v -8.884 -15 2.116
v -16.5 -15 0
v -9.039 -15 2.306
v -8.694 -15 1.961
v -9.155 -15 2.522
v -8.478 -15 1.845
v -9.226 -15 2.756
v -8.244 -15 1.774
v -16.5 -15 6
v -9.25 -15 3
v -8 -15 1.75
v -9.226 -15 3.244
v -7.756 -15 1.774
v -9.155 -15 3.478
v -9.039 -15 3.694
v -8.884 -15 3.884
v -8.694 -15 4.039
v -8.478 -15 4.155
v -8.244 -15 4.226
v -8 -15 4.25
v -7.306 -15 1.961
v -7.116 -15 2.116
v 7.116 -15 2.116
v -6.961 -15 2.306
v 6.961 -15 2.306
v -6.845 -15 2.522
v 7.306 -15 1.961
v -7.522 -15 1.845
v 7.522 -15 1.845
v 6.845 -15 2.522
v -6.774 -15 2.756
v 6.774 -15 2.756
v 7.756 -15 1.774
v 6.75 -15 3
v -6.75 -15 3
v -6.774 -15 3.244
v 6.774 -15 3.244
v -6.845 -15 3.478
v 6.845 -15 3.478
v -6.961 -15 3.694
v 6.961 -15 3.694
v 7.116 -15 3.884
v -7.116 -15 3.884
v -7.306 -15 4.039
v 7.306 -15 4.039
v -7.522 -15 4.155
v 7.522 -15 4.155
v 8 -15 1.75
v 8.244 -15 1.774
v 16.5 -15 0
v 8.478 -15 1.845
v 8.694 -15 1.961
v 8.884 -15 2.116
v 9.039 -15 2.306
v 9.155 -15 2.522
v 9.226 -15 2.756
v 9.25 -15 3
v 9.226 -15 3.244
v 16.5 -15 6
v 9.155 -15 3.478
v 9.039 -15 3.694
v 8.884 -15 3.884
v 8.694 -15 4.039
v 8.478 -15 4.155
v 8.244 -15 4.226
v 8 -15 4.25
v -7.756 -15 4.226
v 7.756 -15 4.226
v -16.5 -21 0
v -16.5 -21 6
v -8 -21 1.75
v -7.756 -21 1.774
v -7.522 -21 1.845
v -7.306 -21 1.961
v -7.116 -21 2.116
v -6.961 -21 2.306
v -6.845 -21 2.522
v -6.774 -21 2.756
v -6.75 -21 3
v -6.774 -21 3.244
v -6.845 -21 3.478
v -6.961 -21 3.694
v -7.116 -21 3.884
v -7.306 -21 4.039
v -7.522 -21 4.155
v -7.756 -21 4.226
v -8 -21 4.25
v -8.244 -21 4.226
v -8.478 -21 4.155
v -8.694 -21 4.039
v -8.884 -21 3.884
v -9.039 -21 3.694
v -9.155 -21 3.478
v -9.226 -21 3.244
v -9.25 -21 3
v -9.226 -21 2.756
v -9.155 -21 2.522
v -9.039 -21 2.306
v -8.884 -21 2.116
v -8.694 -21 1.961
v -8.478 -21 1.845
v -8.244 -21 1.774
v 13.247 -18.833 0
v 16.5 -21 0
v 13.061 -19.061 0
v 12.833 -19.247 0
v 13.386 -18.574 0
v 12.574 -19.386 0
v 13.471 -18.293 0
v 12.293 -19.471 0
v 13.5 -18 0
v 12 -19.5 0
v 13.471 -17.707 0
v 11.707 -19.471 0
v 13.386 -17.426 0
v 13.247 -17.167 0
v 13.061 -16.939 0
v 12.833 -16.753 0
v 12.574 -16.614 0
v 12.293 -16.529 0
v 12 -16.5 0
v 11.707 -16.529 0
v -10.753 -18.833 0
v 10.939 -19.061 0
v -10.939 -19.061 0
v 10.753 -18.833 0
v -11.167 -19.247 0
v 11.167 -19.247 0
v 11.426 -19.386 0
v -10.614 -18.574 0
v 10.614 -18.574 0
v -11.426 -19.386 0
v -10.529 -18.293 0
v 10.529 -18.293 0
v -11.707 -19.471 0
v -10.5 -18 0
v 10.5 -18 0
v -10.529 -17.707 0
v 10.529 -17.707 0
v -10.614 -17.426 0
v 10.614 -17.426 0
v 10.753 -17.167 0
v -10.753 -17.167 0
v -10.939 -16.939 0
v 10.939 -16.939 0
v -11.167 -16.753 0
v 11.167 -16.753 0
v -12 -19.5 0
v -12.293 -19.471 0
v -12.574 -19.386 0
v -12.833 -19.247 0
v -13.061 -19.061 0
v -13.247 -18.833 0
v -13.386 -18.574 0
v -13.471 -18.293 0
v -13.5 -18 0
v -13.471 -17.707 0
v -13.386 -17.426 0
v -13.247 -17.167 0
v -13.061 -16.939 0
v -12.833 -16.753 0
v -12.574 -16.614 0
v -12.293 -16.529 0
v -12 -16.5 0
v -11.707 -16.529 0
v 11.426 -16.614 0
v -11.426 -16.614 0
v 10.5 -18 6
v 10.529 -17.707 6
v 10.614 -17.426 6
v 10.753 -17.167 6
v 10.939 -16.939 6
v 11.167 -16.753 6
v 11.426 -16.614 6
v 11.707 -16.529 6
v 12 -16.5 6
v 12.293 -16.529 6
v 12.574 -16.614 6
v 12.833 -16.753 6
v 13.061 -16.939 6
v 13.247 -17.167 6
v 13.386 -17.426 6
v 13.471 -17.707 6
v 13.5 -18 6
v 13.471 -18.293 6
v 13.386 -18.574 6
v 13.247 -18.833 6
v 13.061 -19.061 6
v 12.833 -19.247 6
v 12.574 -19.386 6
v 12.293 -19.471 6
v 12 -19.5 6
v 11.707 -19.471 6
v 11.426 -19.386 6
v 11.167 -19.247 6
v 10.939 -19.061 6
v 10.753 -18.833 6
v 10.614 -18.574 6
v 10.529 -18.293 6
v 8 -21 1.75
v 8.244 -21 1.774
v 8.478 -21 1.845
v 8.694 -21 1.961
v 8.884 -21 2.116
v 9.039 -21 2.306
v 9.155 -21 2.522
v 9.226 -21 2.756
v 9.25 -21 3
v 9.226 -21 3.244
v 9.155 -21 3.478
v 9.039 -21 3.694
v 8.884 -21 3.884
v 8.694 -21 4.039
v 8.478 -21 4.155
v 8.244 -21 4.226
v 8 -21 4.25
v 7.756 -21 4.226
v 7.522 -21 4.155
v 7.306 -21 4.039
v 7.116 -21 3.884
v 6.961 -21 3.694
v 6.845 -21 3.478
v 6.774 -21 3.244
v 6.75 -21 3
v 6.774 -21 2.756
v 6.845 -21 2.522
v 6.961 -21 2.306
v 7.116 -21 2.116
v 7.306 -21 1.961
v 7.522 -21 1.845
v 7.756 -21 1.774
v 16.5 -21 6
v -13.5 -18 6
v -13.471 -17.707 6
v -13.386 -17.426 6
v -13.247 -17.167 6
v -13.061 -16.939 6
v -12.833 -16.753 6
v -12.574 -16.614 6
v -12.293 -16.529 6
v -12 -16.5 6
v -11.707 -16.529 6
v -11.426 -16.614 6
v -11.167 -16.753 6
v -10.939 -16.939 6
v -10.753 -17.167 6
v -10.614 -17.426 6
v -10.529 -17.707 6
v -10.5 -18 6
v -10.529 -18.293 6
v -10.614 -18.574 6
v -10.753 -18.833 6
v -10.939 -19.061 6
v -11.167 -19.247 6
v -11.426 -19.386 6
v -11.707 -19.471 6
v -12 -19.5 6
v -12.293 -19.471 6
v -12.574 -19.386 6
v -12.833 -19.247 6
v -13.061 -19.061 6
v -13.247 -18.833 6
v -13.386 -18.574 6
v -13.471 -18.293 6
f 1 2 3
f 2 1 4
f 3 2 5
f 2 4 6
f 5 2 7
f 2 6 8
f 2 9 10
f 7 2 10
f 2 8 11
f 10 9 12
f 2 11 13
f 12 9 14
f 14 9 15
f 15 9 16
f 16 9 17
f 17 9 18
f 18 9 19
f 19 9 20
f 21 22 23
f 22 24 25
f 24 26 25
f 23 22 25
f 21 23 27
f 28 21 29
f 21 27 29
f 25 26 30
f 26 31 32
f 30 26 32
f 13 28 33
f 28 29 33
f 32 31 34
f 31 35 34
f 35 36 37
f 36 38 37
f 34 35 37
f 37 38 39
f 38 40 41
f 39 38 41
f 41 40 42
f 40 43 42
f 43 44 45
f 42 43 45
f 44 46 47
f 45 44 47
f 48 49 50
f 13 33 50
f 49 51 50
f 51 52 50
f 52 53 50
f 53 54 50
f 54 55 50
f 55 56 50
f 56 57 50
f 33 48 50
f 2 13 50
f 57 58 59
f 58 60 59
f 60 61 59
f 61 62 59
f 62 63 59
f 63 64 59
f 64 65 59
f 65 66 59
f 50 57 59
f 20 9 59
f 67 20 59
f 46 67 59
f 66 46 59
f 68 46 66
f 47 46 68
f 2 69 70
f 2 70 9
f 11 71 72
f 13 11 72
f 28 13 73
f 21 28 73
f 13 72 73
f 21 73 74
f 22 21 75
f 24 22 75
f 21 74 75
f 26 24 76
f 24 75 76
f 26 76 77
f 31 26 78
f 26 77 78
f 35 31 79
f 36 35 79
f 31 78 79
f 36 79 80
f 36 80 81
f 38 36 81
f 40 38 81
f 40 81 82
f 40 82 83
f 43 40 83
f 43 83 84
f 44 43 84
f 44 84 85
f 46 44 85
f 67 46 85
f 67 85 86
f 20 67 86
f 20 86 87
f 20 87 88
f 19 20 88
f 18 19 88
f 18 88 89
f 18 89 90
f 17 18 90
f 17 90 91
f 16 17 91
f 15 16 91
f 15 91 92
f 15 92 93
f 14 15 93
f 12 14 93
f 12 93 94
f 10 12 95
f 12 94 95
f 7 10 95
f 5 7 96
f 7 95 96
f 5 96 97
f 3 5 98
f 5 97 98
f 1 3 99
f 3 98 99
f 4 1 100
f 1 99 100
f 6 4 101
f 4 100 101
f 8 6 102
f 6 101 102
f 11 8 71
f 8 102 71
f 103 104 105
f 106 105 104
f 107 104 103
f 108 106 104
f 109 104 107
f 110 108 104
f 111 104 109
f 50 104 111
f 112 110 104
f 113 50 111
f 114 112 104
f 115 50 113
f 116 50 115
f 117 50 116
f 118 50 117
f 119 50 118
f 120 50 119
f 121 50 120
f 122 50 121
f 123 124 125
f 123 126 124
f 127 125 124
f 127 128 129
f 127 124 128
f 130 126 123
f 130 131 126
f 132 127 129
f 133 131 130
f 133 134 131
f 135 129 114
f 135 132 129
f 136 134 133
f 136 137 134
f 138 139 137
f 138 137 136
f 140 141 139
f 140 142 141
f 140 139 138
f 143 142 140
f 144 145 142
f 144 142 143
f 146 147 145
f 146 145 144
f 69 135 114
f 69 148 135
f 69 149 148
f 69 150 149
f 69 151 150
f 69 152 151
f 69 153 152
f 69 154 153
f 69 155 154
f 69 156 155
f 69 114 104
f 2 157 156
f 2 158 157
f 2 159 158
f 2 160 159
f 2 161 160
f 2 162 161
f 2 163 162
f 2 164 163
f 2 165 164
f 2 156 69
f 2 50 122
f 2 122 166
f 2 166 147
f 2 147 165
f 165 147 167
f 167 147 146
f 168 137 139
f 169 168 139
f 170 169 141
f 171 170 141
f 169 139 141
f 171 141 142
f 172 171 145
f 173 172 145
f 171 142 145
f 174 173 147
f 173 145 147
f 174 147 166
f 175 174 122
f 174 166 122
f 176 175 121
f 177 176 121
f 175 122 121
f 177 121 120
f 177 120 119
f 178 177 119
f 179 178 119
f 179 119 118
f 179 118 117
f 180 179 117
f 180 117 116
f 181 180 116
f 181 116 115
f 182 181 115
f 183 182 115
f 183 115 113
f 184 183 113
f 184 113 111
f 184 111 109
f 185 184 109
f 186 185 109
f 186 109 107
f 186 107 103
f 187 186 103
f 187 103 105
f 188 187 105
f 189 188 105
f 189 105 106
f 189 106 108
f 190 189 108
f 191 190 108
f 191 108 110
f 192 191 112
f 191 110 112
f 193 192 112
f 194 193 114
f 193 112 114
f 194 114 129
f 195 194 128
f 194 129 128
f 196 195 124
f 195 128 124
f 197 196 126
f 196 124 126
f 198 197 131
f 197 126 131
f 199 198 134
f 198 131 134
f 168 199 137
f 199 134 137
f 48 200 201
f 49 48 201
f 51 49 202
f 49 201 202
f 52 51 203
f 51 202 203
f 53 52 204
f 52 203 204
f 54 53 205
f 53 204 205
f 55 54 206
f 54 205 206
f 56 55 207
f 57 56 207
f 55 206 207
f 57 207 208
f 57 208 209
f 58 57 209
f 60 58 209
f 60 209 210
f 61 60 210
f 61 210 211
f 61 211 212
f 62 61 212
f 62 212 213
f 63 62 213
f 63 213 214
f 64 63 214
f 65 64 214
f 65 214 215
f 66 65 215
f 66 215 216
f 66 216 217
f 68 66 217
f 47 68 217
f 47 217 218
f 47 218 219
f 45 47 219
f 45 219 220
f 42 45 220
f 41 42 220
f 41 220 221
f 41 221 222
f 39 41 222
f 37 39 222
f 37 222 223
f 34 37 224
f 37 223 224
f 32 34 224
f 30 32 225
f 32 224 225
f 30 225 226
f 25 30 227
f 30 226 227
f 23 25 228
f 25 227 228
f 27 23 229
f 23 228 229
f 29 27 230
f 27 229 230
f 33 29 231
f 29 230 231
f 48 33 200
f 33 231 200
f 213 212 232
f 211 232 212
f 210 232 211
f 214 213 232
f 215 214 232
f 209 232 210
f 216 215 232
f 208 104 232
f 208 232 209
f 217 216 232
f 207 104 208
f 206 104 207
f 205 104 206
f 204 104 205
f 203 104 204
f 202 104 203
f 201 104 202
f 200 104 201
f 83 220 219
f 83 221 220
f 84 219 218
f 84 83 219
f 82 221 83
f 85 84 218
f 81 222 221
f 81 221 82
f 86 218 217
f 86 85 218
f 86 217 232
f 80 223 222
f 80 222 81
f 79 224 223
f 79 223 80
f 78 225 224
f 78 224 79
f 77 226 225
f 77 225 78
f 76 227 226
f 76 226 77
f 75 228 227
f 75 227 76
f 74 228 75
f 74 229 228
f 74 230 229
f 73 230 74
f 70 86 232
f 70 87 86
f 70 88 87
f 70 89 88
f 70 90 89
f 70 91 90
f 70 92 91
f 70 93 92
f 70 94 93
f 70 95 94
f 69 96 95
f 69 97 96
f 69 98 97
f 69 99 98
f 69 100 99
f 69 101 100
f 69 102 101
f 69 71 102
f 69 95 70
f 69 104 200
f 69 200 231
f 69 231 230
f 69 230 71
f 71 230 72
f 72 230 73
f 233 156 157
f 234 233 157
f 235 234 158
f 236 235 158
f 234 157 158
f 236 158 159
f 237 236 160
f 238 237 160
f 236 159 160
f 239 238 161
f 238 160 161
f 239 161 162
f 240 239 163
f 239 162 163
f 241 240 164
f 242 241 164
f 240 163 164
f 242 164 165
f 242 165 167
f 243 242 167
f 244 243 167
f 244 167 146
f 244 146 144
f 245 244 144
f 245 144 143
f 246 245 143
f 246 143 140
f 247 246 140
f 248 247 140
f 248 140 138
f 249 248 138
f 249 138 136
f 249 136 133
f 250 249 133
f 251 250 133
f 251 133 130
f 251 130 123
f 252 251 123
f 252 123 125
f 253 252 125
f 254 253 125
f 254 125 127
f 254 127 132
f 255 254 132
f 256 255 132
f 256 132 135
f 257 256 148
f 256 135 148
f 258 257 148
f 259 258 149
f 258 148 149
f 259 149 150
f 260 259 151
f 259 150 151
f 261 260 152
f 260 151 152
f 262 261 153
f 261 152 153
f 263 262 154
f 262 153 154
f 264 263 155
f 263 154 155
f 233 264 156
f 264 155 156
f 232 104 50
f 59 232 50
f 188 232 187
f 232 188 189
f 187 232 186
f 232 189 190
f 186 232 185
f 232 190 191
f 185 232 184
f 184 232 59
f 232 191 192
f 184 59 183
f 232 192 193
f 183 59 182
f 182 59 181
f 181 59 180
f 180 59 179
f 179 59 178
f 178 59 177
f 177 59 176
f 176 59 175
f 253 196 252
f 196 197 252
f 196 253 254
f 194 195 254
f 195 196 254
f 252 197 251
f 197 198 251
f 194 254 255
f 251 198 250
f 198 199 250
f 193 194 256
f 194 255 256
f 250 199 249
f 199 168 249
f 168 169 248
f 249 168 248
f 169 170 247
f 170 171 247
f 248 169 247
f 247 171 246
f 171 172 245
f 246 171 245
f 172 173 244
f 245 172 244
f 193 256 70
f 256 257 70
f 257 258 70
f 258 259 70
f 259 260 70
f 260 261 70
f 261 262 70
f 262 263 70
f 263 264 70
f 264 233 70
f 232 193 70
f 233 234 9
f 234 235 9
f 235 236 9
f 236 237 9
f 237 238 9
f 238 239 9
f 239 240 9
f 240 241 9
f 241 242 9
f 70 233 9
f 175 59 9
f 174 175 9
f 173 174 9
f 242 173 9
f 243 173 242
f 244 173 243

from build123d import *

# Parameters (mm, degrees)
SKETCH_1_W          = 53
SKETCH_1_H          = 38
SKETCH_1_W_2        = 45
SKETCH_1_H_2        = 30
EXTRUDE_1_DEPTH     = 6
SKETCH_2_R          = 1.5
CUT_EXTRUDE_1_DEPTH = 59
SKETCH_4_W          = 53
SKETCH_4_H          = 2
EXTRUDE_1_2_DEPTH   = 6
SKETCH_5_R          = 1.5
CUT_EXTRUDE_3_DEPTH = 59
SKETCH_11_W         = 53
SKETCH_11_H         = 4
CUT_EXTRUDE_5_DEPTH = 10
SKETCH_12_W         = 53
SKETCH_12_H         = 30
CUT_EXTRUDE_6_DEPTH = 10
SKETCH_13_R         = 1.25
CUT_EXTRUDE_7_DEPTH = 10
SKETCH_14_W         = 10
SKETCH_14_H         = 6
CUT_EXTRUDE_8_DEPTH = 10


with BuildPart() as part:
    # 草图1 → Extrude 1 (new body)
    with BuildSketch(Plane.XY):
        Rectangle(SKETCH_1_W, SKETCH_1_H)
        Rectangle(SKETCH_1_W_2, SKETCH_1_H_2, mode=Mode.SUBTRACT)
    extrude(amount=EXTRUDE_1_DEPTH)

    # 草图2 → 切除-拉伸1 (cut)
    with BuildSketch(Plane.ZY.offset(26.5)):
        with Locations((3.5, 9)):
            Circle(SKETCH_2_R)
        with Locations((3.5, -9)):
            Circle(SKETCH_2_R)
    extrude(amount=-CUT_EXTRUDE_1_DEPTH, mode=Mode.SUBTRACT)

    # 草图4 → Extrude 1 2 (add)
    with BuildSketch(Plane(origin=(0, 0, 0), x_dir=(-1, 0, 0), z_dir=(0, 0, -1))):
        with Locations((0, -20)):
            Rectangle(SKETCH_4_W, SKETCH_4_H)
    extrude(amount=-EXTRUDE_1_2_DEPTH)

    # 草图5 → 切除-拉伸3 (cut)
    with BuildSketch(Plane(origin=(0, 0, 0), x_dir=(-1, 0, 0), z_dir=(0, 0, -1))):
        with Locations((12, -18)):
            Circle(SKETCH_5_R)
        with Locations((-12, -18)):
            Circle(SKETCH_5_R)
    extrude(amount=-CUT_EXTRUDE_3_DEPTH, mode=Mode.SUBTRACT)

    # 草图11 → 切除-拉伸5 (cut)
    with BuildSketch(Plane.XY.offset(6)):
        with Locations((0, 17)):
            Rectangle(SKETCH_11_W, SKETCH_11_H)
    extrude(amount=-CUT_EXTRUDE_5_DEPTH, mode=Mode.SUBTRACT)

    # 草图12 → 切除-拉伸6 (cut)
    with BuildSketch(Plane.XY.offset(6)):
        Rectangle(SKETCH_12_W, SKETCH_12_H)
    extrude(amount=-CUT_EXTRUDE_6_DEPTH, mode=Mode.SUBTRACT)

    # 草图13 → 切除-拉伸7 (cut)
    with BuildSketch(Plane.XZ.offset(21)):
        with Locations(Location((8, 3, 0), (0, 0, 270))):
            Circle(SKETCH_13_R)
        with Locations(Location((-8, 3, 0), (0, 0, 270))):
            Circle(SKETCH_13_R)
    extrude(amount=-CUT_EXTRUDE_7_DEPTH, mode=Mode.SUBTRACT)

    # 草图14 → 切除-拉伸8 (cut)
    with BuildSketch(Plane(origin=(0, 0, 0), x_dir=(-1, 0, 0), z_dir=(0, 0, -1))):
        with Locations((21.5, -18)):
            Rectangle(SKETCH_14_W, SKETCH_14_H)
        with Locations((-21.5, -18)):
            Rectangle(SKETCH_14_W, SKETCH_14_H)
    extrude(amount=-CUT_EXTRUDE_8_DEPTH, mode=Mode.SUBTRACT)


solid = part.part
